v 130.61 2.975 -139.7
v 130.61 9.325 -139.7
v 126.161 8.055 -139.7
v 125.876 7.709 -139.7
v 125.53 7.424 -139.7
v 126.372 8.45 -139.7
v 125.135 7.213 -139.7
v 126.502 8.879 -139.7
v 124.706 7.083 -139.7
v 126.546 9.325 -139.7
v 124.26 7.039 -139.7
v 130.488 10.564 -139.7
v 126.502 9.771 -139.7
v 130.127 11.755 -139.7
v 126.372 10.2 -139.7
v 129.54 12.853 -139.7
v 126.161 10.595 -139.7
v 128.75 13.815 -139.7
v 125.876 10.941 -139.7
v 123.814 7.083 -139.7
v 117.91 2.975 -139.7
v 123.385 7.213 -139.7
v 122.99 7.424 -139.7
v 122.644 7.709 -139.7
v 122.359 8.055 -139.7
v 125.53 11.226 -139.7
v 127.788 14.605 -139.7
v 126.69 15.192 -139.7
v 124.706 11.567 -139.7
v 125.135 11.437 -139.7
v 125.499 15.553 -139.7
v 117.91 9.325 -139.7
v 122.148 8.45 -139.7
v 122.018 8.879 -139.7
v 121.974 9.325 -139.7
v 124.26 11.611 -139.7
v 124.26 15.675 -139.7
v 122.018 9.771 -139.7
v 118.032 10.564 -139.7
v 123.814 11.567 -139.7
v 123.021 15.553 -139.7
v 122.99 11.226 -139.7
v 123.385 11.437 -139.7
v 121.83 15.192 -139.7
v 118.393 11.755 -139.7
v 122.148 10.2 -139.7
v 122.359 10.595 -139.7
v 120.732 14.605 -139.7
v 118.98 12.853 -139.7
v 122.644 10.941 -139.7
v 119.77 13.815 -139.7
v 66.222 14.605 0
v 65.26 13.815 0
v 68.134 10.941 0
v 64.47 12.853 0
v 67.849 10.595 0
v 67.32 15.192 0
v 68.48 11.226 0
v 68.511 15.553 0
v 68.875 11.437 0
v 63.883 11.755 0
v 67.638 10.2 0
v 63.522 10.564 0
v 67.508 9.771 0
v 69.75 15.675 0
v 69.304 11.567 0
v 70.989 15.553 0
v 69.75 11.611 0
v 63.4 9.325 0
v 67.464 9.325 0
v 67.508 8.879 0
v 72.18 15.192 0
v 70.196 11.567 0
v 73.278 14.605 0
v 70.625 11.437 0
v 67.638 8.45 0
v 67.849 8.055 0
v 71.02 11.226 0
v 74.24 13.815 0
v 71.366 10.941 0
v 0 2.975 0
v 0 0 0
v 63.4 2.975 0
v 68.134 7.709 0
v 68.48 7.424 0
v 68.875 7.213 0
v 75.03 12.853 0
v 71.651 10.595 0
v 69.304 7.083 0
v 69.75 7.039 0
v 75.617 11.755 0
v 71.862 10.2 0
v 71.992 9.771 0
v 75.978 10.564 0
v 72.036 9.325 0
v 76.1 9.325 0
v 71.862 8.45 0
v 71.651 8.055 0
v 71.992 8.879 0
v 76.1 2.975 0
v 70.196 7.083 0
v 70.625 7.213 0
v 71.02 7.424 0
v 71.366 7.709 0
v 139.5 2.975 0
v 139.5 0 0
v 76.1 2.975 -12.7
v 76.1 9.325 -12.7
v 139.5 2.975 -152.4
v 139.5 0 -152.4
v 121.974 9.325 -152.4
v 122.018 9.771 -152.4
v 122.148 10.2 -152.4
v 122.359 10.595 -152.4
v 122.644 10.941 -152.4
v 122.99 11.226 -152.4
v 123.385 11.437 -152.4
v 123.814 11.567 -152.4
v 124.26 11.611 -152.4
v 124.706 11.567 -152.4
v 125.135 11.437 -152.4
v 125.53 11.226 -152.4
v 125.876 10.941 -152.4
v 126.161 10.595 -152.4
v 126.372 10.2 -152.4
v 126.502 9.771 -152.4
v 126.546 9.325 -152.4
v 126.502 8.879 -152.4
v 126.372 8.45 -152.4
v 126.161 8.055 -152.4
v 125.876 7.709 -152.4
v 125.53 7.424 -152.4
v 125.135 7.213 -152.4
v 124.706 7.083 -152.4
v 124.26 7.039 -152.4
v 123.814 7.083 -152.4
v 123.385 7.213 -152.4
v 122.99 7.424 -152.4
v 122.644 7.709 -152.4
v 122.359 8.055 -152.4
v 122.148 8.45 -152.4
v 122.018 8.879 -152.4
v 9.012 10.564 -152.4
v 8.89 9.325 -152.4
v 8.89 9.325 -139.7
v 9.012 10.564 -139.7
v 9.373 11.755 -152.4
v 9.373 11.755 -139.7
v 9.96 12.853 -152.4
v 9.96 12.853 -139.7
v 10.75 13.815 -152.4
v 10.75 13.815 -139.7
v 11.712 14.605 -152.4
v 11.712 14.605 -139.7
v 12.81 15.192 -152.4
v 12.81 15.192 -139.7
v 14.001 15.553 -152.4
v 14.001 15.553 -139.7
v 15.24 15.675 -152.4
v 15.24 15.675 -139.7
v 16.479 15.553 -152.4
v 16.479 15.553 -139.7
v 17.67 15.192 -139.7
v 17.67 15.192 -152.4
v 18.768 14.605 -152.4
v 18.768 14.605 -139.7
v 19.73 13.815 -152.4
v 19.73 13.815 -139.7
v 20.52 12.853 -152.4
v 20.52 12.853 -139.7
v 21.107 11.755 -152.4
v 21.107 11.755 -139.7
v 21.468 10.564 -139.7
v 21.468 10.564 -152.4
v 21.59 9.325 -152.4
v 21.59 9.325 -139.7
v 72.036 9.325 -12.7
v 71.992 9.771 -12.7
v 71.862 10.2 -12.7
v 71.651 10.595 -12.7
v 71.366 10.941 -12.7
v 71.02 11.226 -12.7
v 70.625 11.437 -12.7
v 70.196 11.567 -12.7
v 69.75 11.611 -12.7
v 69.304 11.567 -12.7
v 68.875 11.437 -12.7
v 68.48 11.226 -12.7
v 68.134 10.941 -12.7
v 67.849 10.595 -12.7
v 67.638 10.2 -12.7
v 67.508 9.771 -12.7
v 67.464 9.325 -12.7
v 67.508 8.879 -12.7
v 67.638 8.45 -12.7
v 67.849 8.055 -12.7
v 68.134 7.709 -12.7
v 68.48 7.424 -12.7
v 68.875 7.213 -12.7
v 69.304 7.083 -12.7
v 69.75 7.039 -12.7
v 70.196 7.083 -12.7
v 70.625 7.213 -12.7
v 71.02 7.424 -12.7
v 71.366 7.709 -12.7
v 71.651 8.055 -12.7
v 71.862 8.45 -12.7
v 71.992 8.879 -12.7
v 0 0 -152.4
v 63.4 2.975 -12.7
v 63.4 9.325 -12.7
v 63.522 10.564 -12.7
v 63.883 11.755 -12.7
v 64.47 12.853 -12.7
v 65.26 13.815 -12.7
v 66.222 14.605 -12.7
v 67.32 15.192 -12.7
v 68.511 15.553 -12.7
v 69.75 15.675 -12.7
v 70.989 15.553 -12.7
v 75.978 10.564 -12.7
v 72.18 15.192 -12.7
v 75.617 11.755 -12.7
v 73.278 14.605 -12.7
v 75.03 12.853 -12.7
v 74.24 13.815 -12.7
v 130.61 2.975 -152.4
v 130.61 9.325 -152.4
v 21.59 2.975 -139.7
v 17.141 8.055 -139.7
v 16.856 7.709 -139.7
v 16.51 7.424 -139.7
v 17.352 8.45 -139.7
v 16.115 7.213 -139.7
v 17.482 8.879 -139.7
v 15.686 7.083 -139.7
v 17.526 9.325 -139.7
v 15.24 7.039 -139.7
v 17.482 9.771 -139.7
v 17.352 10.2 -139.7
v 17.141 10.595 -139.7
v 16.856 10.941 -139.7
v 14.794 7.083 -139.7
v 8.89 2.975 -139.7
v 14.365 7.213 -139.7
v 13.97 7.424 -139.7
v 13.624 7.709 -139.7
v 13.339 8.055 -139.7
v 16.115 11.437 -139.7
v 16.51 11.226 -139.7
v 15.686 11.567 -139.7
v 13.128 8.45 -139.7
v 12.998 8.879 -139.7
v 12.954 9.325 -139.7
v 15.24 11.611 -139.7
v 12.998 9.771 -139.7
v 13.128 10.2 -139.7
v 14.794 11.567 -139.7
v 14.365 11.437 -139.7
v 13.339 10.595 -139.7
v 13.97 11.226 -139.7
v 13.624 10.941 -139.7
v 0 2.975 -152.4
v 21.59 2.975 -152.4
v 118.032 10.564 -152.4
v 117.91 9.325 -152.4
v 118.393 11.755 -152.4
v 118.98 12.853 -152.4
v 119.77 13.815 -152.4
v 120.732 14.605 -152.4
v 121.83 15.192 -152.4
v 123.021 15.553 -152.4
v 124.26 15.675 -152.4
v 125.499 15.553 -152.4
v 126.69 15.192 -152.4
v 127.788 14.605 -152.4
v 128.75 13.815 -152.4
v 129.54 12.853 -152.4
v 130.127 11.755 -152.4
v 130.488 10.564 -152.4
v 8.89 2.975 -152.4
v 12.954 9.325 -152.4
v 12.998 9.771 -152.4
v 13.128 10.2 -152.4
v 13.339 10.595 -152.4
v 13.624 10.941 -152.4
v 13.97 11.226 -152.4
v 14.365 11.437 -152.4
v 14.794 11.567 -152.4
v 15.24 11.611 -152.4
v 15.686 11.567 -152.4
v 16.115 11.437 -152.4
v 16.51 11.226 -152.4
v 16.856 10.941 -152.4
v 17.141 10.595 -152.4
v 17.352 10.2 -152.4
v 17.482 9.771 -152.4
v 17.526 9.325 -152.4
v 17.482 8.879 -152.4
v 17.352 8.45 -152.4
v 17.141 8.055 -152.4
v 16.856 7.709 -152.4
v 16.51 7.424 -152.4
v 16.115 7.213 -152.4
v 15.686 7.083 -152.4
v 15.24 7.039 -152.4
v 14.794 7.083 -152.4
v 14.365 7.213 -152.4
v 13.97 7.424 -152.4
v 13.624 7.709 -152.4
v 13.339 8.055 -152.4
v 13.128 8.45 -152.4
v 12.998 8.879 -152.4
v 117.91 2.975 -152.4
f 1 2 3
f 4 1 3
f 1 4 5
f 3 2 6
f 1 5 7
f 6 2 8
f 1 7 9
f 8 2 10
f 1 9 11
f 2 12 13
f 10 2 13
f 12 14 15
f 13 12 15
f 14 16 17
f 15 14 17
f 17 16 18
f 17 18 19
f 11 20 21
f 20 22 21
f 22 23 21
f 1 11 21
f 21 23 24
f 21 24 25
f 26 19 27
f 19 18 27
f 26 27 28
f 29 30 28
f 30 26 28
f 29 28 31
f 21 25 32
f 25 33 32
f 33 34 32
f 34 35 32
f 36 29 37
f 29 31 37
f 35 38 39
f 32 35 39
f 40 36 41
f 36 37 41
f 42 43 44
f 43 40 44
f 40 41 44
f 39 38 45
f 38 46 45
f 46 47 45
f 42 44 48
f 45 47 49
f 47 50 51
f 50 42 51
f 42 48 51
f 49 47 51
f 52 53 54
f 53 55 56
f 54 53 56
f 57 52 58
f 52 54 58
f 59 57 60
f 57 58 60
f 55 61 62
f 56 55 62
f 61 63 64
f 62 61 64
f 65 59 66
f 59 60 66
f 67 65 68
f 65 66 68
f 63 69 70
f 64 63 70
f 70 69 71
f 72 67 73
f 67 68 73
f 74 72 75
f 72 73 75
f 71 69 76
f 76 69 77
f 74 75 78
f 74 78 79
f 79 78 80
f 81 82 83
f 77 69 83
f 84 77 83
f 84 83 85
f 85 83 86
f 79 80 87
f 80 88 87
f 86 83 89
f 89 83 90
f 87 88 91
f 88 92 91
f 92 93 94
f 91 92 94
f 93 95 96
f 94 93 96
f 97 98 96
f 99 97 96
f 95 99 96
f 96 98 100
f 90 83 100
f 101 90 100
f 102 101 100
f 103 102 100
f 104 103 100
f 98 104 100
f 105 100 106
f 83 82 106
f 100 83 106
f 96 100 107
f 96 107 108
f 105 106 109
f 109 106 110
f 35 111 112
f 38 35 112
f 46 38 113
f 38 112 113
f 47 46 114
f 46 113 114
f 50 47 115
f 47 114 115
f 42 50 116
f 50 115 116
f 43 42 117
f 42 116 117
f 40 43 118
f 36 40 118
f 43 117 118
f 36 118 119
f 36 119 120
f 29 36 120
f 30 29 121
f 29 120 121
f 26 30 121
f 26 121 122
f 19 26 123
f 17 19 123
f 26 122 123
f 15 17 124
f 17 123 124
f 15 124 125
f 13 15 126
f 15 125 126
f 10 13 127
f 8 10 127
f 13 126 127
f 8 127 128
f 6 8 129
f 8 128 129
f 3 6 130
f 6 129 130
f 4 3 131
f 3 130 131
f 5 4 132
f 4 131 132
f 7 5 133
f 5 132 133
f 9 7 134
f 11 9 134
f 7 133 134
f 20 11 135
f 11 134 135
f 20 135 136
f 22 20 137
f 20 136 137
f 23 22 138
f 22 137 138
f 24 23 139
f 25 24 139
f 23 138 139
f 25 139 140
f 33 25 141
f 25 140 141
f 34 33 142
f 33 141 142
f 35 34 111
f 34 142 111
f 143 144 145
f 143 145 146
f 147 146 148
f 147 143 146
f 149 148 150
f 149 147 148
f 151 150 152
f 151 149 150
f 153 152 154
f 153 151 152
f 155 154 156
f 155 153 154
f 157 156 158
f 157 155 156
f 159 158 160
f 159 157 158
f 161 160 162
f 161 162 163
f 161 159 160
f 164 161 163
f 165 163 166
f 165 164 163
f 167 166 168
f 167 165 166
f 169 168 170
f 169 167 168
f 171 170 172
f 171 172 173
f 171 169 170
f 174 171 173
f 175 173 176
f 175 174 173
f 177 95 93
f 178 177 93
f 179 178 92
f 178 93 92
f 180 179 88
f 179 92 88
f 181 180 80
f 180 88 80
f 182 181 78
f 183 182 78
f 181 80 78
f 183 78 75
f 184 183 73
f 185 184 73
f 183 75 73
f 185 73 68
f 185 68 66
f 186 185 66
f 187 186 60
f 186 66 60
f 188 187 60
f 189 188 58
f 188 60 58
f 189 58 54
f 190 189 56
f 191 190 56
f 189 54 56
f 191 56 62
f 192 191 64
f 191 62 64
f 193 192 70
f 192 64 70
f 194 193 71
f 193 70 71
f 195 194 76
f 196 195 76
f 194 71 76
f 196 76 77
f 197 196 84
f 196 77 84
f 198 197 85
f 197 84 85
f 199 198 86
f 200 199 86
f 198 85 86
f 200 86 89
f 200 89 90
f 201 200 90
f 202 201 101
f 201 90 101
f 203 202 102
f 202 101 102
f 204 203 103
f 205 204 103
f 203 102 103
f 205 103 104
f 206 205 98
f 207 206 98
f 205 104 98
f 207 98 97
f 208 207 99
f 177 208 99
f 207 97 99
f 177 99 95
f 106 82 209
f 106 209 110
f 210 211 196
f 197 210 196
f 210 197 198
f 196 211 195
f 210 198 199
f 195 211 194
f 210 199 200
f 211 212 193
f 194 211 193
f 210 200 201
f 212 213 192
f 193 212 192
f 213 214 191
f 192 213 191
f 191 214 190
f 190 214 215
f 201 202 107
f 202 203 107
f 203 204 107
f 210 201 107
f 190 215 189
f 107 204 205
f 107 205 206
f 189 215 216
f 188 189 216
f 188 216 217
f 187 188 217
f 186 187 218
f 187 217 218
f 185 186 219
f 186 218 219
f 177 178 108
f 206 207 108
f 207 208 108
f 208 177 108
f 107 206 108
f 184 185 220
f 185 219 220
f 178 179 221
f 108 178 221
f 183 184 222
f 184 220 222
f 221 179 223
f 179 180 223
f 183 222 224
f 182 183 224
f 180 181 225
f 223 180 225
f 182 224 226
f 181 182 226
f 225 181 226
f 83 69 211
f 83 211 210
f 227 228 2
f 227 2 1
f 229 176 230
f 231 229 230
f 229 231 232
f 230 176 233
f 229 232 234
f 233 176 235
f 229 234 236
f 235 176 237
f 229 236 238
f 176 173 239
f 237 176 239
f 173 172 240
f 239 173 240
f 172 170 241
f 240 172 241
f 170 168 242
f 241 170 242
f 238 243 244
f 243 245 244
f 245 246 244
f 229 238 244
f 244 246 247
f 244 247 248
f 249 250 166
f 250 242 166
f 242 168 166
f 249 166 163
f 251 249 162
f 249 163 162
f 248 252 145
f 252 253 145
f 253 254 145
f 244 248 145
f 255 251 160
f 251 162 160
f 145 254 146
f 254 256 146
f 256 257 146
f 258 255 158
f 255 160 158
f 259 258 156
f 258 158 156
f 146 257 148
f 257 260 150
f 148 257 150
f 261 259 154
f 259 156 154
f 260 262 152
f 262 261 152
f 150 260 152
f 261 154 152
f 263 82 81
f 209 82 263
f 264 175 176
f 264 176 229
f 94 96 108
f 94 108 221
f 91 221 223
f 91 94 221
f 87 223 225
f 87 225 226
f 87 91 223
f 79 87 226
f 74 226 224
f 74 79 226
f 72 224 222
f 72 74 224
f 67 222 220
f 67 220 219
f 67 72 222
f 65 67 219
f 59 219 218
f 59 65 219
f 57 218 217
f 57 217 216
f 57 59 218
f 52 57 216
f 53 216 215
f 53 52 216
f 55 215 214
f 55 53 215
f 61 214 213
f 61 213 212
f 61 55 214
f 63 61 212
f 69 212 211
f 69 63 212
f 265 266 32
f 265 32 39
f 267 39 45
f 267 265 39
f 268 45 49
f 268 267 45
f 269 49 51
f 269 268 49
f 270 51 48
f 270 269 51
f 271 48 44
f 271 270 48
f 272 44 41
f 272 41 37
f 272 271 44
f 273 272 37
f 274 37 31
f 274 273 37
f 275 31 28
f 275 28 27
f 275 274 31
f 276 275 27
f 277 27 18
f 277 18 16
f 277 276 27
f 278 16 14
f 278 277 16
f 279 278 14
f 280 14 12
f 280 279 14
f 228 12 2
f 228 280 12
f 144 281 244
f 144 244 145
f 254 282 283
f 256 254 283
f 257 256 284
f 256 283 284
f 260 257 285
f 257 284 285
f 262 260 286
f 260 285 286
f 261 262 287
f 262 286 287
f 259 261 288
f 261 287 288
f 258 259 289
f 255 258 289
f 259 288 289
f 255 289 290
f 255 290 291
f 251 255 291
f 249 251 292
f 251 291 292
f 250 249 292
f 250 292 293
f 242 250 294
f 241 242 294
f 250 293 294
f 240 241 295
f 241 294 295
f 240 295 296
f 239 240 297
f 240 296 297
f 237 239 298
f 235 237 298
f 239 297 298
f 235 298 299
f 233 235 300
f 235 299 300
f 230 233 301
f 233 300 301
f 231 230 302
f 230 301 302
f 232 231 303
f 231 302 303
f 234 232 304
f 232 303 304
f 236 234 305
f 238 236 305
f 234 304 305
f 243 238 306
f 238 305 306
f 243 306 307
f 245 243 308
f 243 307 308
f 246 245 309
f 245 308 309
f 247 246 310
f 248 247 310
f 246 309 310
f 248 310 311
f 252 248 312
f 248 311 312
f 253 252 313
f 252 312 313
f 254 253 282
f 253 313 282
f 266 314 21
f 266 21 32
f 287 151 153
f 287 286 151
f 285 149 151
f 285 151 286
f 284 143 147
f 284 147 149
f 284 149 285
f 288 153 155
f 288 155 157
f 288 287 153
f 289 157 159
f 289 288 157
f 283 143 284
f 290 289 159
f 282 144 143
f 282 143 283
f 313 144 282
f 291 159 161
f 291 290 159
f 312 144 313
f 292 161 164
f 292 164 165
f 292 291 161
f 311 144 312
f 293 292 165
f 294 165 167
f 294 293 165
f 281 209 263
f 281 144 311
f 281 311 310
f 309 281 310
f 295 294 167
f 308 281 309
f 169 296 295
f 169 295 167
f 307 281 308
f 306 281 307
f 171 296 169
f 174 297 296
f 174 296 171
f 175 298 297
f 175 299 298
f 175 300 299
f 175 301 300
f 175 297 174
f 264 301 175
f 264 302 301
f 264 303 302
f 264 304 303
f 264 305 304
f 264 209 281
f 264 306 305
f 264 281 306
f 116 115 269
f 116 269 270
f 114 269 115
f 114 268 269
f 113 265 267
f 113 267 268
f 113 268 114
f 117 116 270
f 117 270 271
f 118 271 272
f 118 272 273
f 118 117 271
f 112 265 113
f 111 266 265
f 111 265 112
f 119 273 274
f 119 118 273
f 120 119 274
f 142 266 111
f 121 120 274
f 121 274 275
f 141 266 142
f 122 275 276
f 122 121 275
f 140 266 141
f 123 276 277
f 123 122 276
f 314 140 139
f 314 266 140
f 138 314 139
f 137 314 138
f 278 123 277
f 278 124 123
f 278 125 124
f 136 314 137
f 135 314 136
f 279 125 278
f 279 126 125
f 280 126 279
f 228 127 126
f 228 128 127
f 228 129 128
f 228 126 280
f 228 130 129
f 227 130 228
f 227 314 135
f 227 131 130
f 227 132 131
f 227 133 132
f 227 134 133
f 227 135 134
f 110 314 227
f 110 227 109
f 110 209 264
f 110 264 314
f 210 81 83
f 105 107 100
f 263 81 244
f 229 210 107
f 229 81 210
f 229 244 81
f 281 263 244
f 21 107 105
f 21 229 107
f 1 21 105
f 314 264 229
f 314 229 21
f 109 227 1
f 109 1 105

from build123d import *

# Parameters (mm, degrees)
SKETCH1_W           = 139.5
SKETCH1_H           = 152.4
BOSS_EXTRUDE1_DEPTH = 6.35
SKETCH2_W           = 139.5
SKETCH2_H           = 152.4
CUT_EXTRUDE1_DEPTH  = 3.375
SKETCH3_R           = 2.286
BOSS_EXTRUDE2_DEPTH = 12.7
SKETCH4_R           = 2.286
BOSS_EXTRUDE3_DEPTH = 12.7


with BuildPart() as part:
    # Sketch1 → Boss-Extrude1 (new body)
    with BuildSketch(Plane(origin=(0, 0, 0), x_dir=(1, 0, 0), z_dir=(0, 1, 0))):
        with Locations((69.75, 76.2)):
            Rectangle(SKETCH1_W, SKETCH1_H)
    extrude(amount=BOSS_EXTRUDE1_DEPTH)

    # Sketch2 → Cut-Extrude1 (cut)
    with BuildSketch(Plane(origin=(0, 6.35, 0), x_dir=(1, 0, 0), z_dir=(0, 1, 0))):
        with Locations((69.75, 76.2)):
            Rectangle(SKETCH2_W, SKETCH2_H)
    extrude(amount=-CUT_EXTRUDE1_DEPTH, mode=Mode.SUBTRACT)

    # Sketch3 → Boss-Extrude2 (add)
    with BuildSketch(Plane.XY):
        with BuildLine():
            Line((63.4, 9.325), (63.4, 2.975))
            Line((63.4, 2.975), (76.1, 2.975))
            Line((76.1, 2.975), (76.1, 9.325000158))
            ThreePointArc((76.1, 9.325000158), (69.749999921, 15.675000158), (63.4, 9.325))
        make_face()
        with Locations((69.75, 9.325000158)):
            Circle(SKETCH3_R, mode=Mode.SUBTRACT)
    extrude(amount=-BOSS_EXTRUDE2_DEPTH)

    # Sketch4 → Boss-Extrude3 (add)
    with BuildSketch(Plane(origin=(0, 0, -152.4), x_dir=(-1, 0, 0), z_dir=(0, 0, -1))):
        with BuildLine():
            Line((-130.61, 9.325), (-130.61, 2.975))
            Line((-130.61, 2.975), (-117.91, 2.975))
            Line((-117.91, 2.975), (-117.91, 9.325))
            ThreePointArc((-117.91, 9.325), (-124.26, 15.675), (-130.61, 9.325))
        make_face()
        with Locations((-124.26, 9.325)):
            Circle(SKETCH4_R, mode=Mode.SUBTRACT)
        with BuildLine():
            Line((-21.59, 9.325), (-21.59, 2.975))
            Line((-21.59, 2.975), (-8.89, 2.975))
            Line((-8.89, 2.975), (-8.89, 9.325))
            ThreePointArc((-8.89, 9.325), (-15.24, 15.675), (-21.59, 9.325))
        make_face()
        with Locations((-15.24, 9.325)):
            Circle(SKETCH4_R, mode=Mode.SUBTRACT)
    extrude(amount=-BOSS_EXTRUDE3_DEPTH)


solid = part.part
